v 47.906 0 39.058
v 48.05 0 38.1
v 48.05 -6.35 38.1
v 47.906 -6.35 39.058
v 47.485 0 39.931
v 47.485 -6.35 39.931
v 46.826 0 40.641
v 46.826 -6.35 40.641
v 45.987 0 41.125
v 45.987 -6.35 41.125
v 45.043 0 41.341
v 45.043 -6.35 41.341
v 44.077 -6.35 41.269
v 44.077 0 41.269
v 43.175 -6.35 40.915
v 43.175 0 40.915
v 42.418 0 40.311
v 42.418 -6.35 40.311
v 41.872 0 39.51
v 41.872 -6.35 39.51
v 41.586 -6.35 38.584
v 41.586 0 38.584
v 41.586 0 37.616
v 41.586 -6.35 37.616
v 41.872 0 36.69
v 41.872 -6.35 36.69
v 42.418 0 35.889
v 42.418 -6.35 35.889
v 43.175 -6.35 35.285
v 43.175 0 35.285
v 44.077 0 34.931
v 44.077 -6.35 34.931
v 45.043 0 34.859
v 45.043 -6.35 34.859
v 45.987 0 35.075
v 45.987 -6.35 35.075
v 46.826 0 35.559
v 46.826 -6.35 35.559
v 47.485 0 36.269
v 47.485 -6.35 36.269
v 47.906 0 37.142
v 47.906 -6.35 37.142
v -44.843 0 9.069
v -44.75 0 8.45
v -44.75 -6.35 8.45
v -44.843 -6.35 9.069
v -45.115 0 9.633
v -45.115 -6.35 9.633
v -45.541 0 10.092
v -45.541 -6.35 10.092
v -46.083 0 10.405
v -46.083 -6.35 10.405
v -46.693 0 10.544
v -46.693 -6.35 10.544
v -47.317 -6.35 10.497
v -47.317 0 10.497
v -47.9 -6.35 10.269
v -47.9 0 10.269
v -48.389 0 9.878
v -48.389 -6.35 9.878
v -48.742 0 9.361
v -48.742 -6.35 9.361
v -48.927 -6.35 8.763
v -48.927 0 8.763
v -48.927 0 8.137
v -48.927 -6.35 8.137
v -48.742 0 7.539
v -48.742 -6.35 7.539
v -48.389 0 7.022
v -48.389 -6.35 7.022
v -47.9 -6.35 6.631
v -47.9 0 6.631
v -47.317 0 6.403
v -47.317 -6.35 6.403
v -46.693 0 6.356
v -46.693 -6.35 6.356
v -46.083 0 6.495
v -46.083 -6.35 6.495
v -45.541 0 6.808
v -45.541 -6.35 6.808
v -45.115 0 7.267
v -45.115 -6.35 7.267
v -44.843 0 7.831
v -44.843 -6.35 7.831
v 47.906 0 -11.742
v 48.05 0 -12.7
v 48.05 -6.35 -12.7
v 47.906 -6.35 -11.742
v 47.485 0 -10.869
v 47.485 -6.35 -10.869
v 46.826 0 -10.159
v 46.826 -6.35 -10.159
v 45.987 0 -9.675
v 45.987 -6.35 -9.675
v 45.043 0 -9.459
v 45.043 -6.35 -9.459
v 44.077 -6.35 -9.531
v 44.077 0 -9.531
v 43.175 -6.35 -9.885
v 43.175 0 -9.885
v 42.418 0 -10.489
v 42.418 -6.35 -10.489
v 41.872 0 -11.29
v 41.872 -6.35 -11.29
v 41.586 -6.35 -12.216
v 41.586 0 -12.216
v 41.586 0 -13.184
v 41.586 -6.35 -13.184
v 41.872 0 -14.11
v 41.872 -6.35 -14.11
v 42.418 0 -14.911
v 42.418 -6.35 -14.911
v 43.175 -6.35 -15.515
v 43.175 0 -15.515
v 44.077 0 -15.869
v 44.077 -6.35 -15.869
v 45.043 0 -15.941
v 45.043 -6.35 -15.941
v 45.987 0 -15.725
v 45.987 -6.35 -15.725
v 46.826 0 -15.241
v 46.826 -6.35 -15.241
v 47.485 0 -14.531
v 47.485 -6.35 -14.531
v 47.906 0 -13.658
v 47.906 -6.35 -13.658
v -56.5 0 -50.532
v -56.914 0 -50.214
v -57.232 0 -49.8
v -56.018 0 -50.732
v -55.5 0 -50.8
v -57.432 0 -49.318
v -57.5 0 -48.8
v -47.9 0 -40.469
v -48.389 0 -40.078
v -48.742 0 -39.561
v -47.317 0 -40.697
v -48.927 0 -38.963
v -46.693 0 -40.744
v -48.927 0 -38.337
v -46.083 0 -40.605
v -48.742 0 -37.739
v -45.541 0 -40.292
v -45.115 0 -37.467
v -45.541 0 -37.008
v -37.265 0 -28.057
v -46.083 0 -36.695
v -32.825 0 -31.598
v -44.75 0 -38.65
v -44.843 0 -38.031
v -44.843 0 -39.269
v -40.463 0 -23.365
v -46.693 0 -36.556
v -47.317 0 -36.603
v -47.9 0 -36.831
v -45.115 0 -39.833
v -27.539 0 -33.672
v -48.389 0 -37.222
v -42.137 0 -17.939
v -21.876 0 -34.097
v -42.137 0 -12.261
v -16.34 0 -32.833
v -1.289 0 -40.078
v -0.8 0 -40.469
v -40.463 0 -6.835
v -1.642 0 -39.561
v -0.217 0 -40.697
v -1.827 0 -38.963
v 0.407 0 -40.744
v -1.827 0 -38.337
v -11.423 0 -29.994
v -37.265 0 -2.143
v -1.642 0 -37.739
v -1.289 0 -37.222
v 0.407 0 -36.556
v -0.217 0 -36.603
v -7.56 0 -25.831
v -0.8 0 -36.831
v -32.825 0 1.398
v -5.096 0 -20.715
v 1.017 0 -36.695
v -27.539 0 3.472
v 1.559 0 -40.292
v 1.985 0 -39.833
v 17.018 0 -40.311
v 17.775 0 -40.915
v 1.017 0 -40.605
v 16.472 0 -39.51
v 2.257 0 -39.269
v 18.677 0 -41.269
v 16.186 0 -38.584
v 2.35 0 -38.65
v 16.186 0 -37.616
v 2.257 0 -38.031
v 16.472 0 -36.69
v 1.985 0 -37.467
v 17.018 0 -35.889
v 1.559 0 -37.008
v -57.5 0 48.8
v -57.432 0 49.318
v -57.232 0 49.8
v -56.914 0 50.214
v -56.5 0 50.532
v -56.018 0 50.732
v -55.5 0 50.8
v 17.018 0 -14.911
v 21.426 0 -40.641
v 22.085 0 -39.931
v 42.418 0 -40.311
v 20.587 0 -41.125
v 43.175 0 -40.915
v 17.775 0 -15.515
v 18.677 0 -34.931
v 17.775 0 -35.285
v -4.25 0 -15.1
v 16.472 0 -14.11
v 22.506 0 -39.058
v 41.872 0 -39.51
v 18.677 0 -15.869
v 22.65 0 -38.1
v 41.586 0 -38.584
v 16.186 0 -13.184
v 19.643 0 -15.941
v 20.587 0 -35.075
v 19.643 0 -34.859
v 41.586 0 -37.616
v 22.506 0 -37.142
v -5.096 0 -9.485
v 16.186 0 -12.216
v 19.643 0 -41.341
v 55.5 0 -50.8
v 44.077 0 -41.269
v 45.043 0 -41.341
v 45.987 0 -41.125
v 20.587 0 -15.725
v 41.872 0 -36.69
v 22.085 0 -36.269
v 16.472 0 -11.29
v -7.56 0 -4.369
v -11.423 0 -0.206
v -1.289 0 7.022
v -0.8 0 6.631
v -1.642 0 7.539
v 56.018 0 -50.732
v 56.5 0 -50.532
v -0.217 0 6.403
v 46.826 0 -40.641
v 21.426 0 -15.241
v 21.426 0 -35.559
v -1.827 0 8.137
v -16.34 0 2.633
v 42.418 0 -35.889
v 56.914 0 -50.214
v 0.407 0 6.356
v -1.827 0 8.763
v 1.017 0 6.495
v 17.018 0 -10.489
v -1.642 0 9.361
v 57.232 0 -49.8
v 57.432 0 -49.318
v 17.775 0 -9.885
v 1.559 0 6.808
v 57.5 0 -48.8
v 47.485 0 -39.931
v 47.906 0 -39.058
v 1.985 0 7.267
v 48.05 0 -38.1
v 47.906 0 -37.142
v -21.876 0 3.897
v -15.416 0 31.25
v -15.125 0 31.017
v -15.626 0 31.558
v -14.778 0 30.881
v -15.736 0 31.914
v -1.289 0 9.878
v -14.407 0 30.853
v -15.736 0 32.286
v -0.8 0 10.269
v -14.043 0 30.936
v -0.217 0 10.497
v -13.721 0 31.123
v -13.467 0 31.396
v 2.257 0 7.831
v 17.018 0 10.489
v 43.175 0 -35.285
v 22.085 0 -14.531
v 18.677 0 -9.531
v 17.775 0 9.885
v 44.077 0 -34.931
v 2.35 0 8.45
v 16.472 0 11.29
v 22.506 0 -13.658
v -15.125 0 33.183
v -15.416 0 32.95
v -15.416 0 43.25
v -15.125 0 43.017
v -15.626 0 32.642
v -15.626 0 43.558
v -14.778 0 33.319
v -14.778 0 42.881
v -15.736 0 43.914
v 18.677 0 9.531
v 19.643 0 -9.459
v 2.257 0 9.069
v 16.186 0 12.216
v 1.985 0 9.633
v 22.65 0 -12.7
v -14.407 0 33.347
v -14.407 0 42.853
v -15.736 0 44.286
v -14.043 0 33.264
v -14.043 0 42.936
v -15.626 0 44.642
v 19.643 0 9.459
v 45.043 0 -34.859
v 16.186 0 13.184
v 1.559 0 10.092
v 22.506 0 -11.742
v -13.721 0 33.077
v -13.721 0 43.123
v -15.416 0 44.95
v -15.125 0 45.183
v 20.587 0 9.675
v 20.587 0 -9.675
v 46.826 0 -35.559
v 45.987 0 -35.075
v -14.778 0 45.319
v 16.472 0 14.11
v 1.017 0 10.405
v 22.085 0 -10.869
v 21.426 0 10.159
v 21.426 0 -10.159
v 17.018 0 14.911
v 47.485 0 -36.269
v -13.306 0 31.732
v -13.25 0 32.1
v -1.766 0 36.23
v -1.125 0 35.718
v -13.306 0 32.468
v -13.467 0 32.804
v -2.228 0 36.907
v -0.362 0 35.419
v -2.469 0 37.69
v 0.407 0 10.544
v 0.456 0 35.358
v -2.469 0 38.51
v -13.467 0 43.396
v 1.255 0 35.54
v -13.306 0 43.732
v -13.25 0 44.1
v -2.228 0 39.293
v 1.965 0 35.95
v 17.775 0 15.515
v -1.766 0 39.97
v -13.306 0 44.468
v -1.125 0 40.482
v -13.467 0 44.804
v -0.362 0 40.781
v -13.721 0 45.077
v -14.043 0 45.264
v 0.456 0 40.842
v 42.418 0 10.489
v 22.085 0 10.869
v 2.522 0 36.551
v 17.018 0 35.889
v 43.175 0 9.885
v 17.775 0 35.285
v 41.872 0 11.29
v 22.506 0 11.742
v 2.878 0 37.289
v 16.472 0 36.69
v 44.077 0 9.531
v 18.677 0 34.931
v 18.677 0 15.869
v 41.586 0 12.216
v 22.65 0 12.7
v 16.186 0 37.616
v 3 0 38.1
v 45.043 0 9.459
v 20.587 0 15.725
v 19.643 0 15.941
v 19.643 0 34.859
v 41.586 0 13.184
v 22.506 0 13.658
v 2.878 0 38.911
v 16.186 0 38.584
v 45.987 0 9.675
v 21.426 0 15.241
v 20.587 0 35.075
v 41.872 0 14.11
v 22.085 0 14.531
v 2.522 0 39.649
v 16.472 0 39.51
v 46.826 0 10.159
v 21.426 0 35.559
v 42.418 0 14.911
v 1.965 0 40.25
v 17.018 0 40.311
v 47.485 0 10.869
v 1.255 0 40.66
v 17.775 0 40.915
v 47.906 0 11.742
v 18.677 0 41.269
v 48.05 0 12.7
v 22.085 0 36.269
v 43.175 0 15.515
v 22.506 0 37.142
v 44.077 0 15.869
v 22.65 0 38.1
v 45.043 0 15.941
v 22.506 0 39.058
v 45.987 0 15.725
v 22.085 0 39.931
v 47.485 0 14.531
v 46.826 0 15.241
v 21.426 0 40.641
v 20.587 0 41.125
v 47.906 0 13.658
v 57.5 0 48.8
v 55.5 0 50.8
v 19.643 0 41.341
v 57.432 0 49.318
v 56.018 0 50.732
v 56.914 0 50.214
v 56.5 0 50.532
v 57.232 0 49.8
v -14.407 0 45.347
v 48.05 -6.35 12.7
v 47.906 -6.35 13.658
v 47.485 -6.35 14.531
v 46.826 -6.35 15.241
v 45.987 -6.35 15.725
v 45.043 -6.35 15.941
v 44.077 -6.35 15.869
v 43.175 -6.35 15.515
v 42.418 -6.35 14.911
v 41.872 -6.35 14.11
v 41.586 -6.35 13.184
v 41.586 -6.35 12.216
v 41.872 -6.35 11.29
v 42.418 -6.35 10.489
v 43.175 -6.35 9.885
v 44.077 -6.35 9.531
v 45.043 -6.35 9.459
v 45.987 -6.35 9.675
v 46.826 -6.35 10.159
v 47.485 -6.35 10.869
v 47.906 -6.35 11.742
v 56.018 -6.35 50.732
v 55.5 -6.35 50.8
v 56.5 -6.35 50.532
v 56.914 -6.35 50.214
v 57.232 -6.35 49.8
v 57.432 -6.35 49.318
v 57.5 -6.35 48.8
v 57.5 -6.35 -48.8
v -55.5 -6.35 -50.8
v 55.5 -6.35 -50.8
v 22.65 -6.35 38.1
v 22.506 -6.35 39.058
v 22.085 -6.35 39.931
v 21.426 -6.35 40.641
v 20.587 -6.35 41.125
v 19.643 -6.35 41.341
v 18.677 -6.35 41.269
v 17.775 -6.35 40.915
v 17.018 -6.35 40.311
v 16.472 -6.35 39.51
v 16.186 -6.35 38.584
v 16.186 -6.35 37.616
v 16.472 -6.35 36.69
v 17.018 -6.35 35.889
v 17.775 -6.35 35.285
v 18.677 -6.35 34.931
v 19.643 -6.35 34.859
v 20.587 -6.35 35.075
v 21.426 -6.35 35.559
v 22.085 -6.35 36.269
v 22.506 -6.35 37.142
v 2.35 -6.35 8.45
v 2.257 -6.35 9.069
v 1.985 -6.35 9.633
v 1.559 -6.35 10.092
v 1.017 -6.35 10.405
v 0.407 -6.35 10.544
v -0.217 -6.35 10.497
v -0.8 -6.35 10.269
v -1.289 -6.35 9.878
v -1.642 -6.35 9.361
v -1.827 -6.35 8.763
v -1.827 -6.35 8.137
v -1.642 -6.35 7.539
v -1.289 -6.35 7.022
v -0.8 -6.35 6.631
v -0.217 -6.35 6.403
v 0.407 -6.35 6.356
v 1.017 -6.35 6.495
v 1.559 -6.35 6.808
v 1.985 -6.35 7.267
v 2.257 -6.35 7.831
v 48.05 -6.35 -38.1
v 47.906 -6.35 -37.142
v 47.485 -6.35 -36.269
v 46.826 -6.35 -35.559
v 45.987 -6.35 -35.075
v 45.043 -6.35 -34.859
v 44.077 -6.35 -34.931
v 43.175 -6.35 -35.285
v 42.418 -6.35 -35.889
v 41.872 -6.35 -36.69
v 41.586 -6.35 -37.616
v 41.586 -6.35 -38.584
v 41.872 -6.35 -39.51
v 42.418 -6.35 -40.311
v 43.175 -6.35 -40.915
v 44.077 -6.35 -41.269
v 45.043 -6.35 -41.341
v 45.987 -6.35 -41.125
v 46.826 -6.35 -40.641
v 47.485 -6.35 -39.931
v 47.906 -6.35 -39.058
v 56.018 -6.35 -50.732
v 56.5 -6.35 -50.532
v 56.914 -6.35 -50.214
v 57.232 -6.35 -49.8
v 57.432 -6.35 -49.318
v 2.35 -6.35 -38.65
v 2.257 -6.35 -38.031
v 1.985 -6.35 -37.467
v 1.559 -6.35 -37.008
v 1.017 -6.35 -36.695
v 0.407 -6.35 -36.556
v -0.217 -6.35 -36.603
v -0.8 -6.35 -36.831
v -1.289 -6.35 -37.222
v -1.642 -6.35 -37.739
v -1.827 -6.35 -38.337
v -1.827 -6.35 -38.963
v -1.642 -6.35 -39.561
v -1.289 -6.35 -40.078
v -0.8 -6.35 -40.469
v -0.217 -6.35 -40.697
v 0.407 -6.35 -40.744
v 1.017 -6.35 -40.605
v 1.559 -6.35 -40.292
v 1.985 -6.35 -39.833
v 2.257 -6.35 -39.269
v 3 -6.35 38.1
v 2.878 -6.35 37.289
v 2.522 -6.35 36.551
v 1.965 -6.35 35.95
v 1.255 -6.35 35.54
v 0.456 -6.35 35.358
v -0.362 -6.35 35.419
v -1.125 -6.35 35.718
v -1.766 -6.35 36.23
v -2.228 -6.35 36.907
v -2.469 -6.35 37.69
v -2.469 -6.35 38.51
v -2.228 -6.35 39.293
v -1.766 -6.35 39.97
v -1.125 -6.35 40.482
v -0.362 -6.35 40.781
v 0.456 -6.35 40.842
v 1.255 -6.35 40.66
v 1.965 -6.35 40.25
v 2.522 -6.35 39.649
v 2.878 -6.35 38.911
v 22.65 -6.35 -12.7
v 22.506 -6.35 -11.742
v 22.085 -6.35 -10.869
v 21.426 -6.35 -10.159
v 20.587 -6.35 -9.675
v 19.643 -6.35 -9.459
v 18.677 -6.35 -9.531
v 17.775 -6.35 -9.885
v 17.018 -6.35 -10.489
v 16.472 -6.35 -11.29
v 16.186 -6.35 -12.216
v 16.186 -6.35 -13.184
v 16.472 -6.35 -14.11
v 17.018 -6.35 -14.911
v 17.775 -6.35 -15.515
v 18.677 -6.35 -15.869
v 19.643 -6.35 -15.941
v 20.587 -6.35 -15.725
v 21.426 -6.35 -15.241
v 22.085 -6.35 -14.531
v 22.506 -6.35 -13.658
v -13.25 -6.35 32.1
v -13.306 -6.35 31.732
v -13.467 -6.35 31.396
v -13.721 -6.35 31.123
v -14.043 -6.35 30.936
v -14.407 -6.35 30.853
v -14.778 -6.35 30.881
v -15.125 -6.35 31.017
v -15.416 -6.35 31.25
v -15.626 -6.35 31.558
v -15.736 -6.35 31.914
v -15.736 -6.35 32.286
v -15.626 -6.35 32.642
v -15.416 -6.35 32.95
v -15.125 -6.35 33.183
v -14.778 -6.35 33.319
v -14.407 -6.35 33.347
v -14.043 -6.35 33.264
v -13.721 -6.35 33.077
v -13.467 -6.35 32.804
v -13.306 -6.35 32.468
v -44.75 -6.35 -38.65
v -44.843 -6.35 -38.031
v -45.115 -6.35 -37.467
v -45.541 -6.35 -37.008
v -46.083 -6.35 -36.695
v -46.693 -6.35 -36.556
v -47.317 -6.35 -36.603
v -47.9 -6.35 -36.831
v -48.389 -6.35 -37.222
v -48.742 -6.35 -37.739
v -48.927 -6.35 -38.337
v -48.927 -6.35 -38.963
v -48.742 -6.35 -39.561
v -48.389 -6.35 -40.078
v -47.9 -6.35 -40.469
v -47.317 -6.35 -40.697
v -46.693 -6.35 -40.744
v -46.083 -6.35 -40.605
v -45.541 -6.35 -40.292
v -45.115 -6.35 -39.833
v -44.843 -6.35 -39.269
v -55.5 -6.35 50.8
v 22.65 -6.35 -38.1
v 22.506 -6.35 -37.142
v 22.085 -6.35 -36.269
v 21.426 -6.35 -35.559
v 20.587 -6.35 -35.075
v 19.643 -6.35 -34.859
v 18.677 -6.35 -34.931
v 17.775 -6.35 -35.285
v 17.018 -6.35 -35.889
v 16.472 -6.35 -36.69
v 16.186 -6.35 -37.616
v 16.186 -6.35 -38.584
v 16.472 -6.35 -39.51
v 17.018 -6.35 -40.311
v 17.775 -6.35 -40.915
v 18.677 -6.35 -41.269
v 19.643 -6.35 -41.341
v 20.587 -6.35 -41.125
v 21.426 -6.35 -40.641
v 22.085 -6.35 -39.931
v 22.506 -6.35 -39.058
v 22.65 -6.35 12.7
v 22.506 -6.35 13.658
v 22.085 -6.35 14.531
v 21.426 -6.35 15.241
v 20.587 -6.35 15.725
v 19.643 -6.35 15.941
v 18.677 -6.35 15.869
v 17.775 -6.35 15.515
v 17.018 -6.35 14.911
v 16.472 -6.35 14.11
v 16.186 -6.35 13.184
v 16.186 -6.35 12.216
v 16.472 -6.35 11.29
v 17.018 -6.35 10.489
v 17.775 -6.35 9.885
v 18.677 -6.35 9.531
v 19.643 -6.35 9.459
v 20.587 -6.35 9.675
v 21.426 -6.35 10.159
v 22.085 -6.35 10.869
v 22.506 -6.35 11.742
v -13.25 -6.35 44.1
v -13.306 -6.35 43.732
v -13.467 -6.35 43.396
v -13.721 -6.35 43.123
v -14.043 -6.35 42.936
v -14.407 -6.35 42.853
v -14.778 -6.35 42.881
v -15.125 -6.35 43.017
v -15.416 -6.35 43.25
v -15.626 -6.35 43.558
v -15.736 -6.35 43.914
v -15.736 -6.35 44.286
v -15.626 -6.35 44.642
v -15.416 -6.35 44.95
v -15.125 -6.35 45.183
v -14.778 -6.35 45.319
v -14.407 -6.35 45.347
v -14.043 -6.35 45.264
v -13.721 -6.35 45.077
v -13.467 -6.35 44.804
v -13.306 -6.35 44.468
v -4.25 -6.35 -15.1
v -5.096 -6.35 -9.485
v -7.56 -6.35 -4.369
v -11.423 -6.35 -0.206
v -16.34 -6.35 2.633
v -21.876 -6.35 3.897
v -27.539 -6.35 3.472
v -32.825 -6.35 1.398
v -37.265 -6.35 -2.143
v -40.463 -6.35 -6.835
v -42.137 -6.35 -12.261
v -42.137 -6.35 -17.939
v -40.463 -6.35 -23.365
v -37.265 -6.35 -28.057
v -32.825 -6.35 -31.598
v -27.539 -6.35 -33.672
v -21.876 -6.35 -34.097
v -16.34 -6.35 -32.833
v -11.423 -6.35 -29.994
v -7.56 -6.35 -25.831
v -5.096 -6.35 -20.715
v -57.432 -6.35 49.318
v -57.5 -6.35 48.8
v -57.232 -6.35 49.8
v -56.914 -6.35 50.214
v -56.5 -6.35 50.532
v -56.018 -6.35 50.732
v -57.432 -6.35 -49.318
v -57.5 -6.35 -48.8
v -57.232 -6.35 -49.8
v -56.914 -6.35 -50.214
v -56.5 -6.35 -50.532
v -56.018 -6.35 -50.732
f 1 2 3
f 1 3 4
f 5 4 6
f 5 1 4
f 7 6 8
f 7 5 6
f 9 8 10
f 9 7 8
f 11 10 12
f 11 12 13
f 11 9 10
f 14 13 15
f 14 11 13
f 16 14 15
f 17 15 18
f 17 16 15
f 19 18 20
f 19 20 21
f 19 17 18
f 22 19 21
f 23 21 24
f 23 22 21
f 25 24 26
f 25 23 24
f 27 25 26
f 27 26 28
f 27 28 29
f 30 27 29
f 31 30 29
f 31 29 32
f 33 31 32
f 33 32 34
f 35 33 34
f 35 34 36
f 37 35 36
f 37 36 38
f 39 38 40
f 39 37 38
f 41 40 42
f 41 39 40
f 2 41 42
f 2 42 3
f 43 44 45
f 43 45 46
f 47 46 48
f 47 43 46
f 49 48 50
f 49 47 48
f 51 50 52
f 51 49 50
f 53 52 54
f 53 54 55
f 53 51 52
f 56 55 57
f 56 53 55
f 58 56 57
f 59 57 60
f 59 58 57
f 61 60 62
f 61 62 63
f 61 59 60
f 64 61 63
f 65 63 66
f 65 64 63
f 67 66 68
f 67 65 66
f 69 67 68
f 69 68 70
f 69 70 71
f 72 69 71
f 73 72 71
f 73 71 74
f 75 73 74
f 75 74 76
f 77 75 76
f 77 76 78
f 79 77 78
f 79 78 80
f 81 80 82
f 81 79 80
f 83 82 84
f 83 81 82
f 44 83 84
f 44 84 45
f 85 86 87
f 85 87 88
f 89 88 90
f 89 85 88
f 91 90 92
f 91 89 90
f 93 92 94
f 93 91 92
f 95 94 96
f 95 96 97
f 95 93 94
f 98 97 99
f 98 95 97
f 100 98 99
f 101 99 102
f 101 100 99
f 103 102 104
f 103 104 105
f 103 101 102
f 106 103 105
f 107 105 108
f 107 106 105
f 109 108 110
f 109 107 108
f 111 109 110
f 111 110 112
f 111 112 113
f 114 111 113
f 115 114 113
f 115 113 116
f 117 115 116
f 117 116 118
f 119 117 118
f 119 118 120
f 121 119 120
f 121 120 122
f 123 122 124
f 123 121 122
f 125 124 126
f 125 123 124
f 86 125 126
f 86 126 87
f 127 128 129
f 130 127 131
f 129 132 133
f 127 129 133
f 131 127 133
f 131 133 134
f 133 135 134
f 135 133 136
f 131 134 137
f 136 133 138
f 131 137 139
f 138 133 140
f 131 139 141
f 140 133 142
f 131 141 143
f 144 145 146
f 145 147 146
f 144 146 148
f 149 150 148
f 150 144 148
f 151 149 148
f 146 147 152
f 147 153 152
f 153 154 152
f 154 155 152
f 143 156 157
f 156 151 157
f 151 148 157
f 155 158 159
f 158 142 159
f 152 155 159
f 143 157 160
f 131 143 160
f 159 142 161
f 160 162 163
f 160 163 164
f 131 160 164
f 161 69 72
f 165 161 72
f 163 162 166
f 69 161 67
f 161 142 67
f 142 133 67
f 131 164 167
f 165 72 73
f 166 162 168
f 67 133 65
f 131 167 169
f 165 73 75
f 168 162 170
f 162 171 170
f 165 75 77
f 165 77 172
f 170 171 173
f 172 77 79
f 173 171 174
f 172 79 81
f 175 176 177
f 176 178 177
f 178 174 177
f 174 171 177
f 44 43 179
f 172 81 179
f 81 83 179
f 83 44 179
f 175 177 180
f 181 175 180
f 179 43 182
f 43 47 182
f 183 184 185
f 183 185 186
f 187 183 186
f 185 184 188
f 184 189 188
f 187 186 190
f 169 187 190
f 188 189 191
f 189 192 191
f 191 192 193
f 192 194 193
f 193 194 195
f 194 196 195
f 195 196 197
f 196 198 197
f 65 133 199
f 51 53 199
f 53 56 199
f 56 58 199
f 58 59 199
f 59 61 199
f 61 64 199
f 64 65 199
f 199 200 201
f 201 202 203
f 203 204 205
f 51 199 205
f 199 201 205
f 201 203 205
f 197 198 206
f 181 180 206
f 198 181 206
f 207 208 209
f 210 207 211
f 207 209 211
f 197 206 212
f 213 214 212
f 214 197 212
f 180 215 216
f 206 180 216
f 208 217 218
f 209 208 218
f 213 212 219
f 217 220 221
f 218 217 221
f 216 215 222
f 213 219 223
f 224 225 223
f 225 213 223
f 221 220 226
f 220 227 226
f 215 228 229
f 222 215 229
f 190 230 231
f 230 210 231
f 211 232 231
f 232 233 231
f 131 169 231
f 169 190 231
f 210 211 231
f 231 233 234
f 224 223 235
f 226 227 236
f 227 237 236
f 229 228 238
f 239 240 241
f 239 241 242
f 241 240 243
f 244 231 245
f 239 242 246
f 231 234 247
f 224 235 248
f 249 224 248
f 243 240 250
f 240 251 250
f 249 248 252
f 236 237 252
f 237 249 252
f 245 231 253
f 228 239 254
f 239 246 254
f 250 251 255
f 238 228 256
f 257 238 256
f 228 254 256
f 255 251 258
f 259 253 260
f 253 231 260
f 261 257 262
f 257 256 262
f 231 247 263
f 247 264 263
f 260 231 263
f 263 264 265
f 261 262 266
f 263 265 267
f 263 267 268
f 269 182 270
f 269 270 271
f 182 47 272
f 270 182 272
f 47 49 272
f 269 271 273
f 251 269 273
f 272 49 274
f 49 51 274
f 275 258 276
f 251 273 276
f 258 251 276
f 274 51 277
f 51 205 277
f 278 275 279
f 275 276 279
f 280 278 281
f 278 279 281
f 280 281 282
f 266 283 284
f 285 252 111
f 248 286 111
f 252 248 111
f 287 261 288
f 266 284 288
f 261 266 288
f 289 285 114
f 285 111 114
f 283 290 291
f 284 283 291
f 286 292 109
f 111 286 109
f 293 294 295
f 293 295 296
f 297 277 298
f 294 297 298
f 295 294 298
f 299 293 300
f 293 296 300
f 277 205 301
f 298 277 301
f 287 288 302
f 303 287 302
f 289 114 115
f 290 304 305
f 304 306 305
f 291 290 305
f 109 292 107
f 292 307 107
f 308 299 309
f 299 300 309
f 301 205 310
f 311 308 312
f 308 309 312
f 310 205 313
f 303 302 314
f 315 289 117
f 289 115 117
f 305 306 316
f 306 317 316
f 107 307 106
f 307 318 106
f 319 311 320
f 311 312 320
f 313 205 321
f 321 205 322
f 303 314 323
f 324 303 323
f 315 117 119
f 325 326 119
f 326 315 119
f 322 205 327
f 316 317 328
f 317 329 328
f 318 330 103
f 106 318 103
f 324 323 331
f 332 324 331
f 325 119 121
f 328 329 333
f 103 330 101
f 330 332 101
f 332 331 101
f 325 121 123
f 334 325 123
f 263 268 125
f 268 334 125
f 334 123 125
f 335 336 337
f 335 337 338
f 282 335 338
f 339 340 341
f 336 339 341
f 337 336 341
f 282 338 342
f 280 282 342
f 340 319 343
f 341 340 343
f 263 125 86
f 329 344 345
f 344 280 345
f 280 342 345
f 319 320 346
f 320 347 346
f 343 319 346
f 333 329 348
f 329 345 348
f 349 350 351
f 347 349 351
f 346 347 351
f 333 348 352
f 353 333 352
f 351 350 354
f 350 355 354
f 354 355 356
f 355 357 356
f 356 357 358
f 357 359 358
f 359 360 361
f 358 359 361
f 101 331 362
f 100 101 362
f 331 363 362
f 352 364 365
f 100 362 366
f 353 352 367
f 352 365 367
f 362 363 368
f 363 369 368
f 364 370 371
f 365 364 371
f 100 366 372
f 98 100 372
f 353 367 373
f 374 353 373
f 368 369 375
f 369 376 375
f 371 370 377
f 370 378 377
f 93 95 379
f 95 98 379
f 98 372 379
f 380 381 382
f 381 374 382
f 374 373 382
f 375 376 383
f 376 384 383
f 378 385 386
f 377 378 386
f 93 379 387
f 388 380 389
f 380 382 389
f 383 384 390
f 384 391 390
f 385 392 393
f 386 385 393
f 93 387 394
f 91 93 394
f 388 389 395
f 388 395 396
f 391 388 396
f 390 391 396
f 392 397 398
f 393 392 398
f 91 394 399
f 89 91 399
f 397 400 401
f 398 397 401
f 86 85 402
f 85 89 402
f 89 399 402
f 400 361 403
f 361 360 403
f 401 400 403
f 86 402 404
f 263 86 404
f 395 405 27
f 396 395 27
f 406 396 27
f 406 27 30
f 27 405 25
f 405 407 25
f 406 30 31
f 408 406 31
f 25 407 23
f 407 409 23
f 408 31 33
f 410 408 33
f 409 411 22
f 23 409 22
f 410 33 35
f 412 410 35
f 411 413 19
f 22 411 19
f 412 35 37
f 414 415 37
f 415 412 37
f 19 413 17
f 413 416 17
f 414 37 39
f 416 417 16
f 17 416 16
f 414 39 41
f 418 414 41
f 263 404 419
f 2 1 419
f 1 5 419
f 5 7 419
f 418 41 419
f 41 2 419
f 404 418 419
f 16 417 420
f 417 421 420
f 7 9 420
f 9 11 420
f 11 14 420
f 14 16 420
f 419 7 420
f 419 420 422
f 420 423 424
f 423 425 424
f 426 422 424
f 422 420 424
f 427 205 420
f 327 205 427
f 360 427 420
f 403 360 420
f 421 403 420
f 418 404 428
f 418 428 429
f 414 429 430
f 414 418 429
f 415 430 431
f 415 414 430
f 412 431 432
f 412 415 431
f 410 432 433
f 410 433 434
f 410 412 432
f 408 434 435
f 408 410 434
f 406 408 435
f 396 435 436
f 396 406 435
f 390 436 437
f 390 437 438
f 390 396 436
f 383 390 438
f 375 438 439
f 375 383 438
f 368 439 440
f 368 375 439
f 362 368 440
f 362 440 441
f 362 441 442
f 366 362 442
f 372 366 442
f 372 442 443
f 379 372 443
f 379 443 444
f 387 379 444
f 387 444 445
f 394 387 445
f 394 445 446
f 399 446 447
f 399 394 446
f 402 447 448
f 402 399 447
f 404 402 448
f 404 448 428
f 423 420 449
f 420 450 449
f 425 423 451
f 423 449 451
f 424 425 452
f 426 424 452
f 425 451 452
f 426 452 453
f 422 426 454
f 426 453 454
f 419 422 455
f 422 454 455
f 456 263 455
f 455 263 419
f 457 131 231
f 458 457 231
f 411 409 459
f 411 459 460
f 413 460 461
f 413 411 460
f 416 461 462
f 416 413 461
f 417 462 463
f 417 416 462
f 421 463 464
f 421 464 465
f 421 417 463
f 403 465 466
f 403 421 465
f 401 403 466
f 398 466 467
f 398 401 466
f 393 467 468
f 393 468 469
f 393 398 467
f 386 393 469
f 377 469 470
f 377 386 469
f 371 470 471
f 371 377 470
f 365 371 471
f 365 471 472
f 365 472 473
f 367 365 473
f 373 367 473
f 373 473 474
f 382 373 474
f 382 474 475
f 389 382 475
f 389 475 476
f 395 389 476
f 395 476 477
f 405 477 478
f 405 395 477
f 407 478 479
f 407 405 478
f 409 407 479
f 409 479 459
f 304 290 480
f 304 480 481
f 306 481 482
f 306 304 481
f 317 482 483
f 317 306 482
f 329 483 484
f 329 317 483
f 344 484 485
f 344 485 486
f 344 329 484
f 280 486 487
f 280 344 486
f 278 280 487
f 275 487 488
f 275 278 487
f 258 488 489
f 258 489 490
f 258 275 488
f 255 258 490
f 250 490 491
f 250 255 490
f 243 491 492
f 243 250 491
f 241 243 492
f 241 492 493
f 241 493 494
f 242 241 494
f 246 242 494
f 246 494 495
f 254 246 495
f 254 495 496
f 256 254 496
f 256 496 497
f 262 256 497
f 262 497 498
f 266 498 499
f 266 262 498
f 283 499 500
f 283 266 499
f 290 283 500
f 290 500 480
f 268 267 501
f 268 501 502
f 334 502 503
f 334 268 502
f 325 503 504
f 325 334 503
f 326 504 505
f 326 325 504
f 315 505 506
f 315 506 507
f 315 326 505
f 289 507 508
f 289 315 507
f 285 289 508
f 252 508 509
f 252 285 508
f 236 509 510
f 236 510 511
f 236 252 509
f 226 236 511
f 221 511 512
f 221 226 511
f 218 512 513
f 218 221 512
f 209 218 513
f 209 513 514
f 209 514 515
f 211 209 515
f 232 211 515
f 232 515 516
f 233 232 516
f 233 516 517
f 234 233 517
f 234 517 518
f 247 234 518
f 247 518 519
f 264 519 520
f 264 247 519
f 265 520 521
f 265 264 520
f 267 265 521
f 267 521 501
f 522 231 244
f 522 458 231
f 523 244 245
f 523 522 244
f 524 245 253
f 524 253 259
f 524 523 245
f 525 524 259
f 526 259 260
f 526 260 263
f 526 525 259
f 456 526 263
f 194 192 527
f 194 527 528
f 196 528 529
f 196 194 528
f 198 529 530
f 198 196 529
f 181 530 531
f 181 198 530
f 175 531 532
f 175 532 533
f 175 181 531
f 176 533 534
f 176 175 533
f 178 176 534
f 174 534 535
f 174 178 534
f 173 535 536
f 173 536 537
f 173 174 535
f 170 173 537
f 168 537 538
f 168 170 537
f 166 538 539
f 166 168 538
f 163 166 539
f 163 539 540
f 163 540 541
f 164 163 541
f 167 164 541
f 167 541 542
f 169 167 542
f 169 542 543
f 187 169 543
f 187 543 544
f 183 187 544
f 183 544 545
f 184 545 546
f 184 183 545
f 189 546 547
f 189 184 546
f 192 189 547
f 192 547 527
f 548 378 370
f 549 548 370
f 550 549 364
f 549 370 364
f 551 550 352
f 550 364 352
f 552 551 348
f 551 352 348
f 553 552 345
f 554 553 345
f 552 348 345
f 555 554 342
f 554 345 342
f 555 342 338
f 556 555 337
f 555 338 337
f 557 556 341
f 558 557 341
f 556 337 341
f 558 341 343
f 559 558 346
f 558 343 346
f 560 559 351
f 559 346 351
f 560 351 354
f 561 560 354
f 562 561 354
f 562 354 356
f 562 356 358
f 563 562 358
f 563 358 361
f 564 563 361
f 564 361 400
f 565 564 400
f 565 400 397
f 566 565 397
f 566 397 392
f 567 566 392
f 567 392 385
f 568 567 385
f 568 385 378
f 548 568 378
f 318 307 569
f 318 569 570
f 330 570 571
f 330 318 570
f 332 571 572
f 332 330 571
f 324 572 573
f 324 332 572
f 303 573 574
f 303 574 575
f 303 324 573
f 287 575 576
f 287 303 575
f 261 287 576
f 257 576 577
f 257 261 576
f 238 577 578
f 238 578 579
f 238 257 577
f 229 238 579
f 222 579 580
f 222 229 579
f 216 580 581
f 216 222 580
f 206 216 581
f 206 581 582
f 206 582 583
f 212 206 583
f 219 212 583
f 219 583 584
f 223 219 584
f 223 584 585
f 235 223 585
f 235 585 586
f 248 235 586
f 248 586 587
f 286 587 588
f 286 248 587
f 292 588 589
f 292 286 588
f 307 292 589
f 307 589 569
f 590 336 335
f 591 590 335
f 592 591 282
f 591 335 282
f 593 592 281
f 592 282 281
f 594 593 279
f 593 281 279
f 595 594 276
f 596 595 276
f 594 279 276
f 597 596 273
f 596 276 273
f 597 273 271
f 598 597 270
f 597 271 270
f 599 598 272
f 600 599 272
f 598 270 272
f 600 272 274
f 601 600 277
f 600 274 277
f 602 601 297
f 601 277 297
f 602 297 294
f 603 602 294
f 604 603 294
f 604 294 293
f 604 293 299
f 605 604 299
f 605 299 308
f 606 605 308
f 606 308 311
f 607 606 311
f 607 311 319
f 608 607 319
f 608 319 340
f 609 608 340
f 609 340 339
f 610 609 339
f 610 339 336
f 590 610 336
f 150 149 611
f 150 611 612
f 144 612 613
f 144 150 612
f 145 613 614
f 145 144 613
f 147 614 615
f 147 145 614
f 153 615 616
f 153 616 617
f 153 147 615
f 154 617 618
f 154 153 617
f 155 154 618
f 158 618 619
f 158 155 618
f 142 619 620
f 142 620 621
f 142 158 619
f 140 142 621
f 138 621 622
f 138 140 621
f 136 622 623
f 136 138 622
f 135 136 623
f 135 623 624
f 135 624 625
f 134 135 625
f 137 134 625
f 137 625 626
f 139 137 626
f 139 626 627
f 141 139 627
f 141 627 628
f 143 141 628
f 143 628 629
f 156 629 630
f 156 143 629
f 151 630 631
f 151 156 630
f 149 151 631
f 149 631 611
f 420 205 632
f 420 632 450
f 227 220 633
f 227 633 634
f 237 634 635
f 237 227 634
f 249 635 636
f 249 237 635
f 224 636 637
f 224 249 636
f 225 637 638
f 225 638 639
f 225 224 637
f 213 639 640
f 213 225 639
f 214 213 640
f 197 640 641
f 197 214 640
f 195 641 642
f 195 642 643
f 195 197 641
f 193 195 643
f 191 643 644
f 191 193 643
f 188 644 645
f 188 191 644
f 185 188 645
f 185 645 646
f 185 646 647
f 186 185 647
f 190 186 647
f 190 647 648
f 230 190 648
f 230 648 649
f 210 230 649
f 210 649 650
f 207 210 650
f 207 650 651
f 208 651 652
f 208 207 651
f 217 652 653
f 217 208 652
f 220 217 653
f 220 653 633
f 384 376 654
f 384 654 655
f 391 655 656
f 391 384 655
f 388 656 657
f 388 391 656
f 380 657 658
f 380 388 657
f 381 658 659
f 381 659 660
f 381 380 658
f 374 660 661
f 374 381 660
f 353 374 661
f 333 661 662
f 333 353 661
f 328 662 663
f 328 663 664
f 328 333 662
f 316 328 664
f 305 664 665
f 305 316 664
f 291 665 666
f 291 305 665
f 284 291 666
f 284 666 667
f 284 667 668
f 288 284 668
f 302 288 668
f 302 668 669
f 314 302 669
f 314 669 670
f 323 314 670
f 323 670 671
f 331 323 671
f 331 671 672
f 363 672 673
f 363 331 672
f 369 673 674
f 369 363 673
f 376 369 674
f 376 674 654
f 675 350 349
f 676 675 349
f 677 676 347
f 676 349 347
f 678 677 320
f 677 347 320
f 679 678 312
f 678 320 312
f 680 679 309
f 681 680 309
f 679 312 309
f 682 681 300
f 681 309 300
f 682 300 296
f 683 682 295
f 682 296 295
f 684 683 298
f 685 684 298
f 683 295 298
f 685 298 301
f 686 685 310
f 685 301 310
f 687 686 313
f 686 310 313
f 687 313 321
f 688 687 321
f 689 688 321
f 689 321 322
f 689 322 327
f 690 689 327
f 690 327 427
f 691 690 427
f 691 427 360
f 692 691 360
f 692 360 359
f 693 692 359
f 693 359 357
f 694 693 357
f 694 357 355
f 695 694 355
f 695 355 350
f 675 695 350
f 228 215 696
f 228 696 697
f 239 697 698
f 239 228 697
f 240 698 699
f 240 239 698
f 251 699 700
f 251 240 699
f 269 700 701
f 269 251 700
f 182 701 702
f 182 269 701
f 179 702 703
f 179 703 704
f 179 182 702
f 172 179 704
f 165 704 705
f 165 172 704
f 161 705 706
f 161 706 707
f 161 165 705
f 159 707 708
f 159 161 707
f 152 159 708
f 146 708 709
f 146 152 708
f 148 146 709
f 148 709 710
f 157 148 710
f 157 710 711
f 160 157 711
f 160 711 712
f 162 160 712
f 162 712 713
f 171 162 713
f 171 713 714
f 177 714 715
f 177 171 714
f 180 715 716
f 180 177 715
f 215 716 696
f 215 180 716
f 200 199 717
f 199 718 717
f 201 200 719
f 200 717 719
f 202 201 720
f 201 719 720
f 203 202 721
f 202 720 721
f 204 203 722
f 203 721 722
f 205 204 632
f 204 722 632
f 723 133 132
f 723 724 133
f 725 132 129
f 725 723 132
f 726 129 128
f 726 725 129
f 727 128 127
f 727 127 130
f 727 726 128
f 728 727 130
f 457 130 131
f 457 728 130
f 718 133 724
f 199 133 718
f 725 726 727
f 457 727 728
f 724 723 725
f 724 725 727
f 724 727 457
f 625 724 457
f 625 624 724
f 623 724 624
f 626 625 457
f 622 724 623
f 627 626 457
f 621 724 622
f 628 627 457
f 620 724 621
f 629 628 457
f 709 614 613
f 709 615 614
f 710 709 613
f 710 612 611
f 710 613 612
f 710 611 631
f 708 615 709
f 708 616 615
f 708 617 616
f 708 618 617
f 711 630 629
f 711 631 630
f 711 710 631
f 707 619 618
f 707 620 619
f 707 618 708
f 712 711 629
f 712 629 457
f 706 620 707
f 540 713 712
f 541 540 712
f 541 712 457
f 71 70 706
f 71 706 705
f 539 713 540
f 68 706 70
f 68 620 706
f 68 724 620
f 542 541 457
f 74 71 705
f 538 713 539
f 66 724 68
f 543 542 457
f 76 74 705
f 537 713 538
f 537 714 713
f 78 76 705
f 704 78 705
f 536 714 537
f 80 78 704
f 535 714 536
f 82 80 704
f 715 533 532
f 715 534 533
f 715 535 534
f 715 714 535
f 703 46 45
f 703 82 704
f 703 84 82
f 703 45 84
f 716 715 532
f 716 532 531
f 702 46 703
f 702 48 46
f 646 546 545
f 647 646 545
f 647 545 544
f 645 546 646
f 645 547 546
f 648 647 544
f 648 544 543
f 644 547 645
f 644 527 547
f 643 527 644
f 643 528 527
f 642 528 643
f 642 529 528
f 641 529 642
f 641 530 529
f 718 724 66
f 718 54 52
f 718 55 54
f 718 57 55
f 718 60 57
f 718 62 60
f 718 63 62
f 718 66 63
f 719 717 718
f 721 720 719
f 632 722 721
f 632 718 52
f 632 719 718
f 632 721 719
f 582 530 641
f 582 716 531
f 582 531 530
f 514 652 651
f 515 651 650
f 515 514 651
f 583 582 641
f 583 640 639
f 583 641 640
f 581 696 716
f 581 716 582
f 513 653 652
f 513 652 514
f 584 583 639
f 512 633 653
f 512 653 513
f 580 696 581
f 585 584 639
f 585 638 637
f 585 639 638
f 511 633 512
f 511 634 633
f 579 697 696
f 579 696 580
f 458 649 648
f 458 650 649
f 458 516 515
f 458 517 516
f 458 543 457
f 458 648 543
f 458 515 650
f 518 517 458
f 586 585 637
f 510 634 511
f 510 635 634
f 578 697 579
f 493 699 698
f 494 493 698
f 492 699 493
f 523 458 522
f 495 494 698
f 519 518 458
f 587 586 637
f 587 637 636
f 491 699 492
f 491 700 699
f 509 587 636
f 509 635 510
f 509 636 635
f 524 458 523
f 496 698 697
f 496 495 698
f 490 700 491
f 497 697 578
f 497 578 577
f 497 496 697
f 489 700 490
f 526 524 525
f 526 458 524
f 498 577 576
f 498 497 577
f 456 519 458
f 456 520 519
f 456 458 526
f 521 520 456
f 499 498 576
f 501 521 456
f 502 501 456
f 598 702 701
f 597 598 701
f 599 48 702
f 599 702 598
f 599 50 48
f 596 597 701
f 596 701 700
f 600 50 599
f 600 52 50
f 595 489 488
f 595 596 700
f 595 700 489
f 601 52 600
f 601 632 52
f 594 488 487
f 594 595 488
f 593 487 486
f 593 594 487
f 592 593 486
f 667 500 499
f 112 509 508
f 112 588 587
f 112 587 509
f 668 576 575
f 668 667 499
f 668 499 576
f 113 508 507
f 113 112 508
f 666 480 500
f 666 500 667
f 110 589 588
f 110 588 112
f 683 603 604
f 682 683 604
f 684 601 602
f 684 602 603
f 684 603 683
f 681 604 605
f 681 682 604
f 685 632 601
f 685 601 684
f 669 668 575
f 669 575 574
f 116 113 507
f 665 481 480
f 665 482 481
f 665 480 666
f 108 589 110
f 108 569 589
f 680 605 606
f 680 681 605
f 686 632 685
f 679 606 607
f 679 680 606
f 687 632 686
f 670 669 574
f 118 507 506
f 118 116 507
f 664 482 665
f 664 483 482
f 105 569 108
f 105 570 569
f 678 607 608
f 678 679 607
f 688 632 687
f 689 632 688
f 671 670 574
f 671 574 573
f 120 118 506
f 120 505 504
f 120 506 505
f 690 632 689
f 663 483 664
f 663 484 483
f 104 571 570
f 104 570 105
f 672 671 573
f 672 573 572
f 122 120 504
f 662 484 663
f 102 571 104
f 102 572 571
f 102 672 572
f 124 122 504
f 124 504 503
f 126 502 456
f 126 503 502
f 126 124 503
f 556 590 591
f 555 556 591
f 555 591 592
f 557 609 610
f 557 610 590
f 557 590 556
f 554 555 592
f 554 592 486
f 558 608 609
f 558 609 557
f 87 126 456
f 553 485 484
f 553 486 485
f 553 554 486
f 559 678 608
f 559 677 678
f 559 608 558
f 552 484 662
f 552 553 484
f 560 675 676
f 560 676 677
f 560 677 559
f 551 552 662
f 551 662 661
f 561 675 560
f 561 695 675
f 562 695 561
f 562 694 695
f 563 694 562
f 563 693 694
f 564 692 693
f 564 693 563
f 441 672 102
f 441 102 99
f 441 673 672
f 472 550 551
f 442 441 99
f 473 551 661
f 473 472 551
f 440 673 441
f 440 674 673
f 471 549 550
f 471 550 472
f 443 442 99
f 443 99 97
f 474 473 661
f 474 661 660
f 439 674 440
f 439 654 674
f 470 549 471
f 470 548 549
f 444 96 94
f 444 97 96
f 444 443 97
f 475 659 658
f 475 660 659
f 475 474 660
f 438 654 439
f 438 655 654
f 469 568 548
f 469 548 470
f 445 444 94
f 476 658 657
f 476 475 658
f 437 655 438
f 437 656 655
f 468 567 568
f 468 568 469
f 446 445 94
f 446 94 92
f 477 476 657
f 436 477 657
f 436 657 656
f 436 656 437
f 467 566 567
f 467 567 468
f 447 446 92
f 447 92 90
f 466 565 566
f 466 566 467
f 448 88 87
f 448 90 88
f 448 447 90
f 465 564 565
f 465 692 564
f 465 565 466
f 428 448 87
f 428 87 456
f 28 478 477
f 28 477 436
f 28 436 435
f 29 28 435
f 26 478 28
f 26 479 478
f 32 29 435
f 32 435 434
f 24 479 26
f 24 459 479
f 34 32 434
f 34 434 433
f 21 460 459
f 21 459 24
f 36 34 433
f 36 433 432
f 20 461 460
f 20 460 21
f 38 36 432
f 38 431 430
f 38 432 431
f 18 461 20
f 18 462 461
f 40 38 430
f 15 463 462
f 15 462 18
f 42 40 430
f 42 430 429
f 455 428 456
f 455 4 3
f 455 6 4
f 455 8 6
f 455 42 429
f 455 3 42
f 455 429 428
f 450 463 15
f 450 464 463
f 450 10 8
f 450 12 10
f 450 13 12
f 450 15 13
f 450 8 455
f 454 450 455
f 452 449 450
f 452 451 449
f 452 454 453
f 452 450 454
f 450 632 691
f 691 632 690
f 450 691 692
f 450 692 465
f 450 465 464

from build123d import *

# Parameters (mm, degrees)
SKETCH002_W   = 115
SKETCH002_H   = 101.6
SKETCH002_R   = 3.25
SKETCH002_R_2 = 19.05
SKETCH002_R_3 = 2.1
PAD002_DEPTH  = 6.35
FILLET_R      = 2
SKETCH004_R   = 1.25
SKETCH004_R_2 = 2.75
POCKET_DEPTH  = 6.351


with BuildPart() as part:
    # Sketch002 → Pad002 (new body)
    with BuildSketch(Plane.XZ):
        Rectangle(SKETCH002_W, SKETCH002_H)
        with Locations((19.4, 38.1)):
            Circle(SKETCH002_R, mode=Mode.SUBTRACT)
        with Locations((44.8, 38.1)):
            Circle(SKETCH002_R, mode=Mode.SUBTRACT)
        with Locations((19.4, 12.7)):
            Circle(SKETCH002_R, mode=Mode.SUBTRACT)
        with Locations((44.8, 12.7)):
            Circle(SKETCH002_R, mode=Mode.SUBTRACT)
        with Locations((19.4, -12.7)):
            Circle(SKETCH002_R, mode=Mode.SUBTRACT)
        with Locations((44.8, -12.7)):
            Circle(SKETCH002_R, mode=Mode.SUBTRACT)
        with Locations((19.4, -38.1)):
            Circle(SKETCH002_R, mode=Mode.SUBTRACT)
        with Locations((44.8, -38.1)):
            Circle(SKETCH002_R, mode=Mode.SUBTRACT)
        with Locations((-23.3, -15.1)):
            Circle(SKETCH002_R_2, mode=Mode.SUBTRACT)
        with Locations((-46.85, 8.45)):
            Circle(SKETCH002_R_3, mode=Mode.SUBTRACT)
        with Locations((0.25, 8.45)):
            Circle(SKETCH002_R_3, mode=Mode.SUBTRACT)
        with Locations((-46.85, -38.65)):
            Circle(SKETCH002_R_3, mode=Mode.SUBTRACT)
        with Locations((0.25, -38.65)):
            Circle(SKETCH002_R_3, mode=Mode.SUBTRACT)
    extrude(amount=PAD002_DEPTH)

    # Fillet
    fillet_edges = [part.edges().sort_by_distance(p)[0] for p in [
        (57.5, -3.175, 50.8),
        (57.5, -3.175, -50.8),
        (-57.5, -3.175, -50.8),
        (-57.5, -3.175, 50.8),
    ]]
    fillet(fillet_edges, radius=FILLET_R)

    # Sketch004 (on Face2 of Fillet) → Pocket (cut, through all)
    with BuildSketch(Plane(origin=(0, 0, 0), x_dir=(1, 0, 0), z_dir=(0, 1, 0))):
        with Locations((-14.5, -32.1)):
            Circle(SKETCH004_R)
        with Locations((-14.5, -44.1)):
            Circle(SKETCH004_R)
        with Locations((0.25, -38.1)):
            Circle(SKETCH004_R_2)
    extrude(amount=-POCKET_DEPTH, mode=Mode.SUBTRACT)


solid = part.part
